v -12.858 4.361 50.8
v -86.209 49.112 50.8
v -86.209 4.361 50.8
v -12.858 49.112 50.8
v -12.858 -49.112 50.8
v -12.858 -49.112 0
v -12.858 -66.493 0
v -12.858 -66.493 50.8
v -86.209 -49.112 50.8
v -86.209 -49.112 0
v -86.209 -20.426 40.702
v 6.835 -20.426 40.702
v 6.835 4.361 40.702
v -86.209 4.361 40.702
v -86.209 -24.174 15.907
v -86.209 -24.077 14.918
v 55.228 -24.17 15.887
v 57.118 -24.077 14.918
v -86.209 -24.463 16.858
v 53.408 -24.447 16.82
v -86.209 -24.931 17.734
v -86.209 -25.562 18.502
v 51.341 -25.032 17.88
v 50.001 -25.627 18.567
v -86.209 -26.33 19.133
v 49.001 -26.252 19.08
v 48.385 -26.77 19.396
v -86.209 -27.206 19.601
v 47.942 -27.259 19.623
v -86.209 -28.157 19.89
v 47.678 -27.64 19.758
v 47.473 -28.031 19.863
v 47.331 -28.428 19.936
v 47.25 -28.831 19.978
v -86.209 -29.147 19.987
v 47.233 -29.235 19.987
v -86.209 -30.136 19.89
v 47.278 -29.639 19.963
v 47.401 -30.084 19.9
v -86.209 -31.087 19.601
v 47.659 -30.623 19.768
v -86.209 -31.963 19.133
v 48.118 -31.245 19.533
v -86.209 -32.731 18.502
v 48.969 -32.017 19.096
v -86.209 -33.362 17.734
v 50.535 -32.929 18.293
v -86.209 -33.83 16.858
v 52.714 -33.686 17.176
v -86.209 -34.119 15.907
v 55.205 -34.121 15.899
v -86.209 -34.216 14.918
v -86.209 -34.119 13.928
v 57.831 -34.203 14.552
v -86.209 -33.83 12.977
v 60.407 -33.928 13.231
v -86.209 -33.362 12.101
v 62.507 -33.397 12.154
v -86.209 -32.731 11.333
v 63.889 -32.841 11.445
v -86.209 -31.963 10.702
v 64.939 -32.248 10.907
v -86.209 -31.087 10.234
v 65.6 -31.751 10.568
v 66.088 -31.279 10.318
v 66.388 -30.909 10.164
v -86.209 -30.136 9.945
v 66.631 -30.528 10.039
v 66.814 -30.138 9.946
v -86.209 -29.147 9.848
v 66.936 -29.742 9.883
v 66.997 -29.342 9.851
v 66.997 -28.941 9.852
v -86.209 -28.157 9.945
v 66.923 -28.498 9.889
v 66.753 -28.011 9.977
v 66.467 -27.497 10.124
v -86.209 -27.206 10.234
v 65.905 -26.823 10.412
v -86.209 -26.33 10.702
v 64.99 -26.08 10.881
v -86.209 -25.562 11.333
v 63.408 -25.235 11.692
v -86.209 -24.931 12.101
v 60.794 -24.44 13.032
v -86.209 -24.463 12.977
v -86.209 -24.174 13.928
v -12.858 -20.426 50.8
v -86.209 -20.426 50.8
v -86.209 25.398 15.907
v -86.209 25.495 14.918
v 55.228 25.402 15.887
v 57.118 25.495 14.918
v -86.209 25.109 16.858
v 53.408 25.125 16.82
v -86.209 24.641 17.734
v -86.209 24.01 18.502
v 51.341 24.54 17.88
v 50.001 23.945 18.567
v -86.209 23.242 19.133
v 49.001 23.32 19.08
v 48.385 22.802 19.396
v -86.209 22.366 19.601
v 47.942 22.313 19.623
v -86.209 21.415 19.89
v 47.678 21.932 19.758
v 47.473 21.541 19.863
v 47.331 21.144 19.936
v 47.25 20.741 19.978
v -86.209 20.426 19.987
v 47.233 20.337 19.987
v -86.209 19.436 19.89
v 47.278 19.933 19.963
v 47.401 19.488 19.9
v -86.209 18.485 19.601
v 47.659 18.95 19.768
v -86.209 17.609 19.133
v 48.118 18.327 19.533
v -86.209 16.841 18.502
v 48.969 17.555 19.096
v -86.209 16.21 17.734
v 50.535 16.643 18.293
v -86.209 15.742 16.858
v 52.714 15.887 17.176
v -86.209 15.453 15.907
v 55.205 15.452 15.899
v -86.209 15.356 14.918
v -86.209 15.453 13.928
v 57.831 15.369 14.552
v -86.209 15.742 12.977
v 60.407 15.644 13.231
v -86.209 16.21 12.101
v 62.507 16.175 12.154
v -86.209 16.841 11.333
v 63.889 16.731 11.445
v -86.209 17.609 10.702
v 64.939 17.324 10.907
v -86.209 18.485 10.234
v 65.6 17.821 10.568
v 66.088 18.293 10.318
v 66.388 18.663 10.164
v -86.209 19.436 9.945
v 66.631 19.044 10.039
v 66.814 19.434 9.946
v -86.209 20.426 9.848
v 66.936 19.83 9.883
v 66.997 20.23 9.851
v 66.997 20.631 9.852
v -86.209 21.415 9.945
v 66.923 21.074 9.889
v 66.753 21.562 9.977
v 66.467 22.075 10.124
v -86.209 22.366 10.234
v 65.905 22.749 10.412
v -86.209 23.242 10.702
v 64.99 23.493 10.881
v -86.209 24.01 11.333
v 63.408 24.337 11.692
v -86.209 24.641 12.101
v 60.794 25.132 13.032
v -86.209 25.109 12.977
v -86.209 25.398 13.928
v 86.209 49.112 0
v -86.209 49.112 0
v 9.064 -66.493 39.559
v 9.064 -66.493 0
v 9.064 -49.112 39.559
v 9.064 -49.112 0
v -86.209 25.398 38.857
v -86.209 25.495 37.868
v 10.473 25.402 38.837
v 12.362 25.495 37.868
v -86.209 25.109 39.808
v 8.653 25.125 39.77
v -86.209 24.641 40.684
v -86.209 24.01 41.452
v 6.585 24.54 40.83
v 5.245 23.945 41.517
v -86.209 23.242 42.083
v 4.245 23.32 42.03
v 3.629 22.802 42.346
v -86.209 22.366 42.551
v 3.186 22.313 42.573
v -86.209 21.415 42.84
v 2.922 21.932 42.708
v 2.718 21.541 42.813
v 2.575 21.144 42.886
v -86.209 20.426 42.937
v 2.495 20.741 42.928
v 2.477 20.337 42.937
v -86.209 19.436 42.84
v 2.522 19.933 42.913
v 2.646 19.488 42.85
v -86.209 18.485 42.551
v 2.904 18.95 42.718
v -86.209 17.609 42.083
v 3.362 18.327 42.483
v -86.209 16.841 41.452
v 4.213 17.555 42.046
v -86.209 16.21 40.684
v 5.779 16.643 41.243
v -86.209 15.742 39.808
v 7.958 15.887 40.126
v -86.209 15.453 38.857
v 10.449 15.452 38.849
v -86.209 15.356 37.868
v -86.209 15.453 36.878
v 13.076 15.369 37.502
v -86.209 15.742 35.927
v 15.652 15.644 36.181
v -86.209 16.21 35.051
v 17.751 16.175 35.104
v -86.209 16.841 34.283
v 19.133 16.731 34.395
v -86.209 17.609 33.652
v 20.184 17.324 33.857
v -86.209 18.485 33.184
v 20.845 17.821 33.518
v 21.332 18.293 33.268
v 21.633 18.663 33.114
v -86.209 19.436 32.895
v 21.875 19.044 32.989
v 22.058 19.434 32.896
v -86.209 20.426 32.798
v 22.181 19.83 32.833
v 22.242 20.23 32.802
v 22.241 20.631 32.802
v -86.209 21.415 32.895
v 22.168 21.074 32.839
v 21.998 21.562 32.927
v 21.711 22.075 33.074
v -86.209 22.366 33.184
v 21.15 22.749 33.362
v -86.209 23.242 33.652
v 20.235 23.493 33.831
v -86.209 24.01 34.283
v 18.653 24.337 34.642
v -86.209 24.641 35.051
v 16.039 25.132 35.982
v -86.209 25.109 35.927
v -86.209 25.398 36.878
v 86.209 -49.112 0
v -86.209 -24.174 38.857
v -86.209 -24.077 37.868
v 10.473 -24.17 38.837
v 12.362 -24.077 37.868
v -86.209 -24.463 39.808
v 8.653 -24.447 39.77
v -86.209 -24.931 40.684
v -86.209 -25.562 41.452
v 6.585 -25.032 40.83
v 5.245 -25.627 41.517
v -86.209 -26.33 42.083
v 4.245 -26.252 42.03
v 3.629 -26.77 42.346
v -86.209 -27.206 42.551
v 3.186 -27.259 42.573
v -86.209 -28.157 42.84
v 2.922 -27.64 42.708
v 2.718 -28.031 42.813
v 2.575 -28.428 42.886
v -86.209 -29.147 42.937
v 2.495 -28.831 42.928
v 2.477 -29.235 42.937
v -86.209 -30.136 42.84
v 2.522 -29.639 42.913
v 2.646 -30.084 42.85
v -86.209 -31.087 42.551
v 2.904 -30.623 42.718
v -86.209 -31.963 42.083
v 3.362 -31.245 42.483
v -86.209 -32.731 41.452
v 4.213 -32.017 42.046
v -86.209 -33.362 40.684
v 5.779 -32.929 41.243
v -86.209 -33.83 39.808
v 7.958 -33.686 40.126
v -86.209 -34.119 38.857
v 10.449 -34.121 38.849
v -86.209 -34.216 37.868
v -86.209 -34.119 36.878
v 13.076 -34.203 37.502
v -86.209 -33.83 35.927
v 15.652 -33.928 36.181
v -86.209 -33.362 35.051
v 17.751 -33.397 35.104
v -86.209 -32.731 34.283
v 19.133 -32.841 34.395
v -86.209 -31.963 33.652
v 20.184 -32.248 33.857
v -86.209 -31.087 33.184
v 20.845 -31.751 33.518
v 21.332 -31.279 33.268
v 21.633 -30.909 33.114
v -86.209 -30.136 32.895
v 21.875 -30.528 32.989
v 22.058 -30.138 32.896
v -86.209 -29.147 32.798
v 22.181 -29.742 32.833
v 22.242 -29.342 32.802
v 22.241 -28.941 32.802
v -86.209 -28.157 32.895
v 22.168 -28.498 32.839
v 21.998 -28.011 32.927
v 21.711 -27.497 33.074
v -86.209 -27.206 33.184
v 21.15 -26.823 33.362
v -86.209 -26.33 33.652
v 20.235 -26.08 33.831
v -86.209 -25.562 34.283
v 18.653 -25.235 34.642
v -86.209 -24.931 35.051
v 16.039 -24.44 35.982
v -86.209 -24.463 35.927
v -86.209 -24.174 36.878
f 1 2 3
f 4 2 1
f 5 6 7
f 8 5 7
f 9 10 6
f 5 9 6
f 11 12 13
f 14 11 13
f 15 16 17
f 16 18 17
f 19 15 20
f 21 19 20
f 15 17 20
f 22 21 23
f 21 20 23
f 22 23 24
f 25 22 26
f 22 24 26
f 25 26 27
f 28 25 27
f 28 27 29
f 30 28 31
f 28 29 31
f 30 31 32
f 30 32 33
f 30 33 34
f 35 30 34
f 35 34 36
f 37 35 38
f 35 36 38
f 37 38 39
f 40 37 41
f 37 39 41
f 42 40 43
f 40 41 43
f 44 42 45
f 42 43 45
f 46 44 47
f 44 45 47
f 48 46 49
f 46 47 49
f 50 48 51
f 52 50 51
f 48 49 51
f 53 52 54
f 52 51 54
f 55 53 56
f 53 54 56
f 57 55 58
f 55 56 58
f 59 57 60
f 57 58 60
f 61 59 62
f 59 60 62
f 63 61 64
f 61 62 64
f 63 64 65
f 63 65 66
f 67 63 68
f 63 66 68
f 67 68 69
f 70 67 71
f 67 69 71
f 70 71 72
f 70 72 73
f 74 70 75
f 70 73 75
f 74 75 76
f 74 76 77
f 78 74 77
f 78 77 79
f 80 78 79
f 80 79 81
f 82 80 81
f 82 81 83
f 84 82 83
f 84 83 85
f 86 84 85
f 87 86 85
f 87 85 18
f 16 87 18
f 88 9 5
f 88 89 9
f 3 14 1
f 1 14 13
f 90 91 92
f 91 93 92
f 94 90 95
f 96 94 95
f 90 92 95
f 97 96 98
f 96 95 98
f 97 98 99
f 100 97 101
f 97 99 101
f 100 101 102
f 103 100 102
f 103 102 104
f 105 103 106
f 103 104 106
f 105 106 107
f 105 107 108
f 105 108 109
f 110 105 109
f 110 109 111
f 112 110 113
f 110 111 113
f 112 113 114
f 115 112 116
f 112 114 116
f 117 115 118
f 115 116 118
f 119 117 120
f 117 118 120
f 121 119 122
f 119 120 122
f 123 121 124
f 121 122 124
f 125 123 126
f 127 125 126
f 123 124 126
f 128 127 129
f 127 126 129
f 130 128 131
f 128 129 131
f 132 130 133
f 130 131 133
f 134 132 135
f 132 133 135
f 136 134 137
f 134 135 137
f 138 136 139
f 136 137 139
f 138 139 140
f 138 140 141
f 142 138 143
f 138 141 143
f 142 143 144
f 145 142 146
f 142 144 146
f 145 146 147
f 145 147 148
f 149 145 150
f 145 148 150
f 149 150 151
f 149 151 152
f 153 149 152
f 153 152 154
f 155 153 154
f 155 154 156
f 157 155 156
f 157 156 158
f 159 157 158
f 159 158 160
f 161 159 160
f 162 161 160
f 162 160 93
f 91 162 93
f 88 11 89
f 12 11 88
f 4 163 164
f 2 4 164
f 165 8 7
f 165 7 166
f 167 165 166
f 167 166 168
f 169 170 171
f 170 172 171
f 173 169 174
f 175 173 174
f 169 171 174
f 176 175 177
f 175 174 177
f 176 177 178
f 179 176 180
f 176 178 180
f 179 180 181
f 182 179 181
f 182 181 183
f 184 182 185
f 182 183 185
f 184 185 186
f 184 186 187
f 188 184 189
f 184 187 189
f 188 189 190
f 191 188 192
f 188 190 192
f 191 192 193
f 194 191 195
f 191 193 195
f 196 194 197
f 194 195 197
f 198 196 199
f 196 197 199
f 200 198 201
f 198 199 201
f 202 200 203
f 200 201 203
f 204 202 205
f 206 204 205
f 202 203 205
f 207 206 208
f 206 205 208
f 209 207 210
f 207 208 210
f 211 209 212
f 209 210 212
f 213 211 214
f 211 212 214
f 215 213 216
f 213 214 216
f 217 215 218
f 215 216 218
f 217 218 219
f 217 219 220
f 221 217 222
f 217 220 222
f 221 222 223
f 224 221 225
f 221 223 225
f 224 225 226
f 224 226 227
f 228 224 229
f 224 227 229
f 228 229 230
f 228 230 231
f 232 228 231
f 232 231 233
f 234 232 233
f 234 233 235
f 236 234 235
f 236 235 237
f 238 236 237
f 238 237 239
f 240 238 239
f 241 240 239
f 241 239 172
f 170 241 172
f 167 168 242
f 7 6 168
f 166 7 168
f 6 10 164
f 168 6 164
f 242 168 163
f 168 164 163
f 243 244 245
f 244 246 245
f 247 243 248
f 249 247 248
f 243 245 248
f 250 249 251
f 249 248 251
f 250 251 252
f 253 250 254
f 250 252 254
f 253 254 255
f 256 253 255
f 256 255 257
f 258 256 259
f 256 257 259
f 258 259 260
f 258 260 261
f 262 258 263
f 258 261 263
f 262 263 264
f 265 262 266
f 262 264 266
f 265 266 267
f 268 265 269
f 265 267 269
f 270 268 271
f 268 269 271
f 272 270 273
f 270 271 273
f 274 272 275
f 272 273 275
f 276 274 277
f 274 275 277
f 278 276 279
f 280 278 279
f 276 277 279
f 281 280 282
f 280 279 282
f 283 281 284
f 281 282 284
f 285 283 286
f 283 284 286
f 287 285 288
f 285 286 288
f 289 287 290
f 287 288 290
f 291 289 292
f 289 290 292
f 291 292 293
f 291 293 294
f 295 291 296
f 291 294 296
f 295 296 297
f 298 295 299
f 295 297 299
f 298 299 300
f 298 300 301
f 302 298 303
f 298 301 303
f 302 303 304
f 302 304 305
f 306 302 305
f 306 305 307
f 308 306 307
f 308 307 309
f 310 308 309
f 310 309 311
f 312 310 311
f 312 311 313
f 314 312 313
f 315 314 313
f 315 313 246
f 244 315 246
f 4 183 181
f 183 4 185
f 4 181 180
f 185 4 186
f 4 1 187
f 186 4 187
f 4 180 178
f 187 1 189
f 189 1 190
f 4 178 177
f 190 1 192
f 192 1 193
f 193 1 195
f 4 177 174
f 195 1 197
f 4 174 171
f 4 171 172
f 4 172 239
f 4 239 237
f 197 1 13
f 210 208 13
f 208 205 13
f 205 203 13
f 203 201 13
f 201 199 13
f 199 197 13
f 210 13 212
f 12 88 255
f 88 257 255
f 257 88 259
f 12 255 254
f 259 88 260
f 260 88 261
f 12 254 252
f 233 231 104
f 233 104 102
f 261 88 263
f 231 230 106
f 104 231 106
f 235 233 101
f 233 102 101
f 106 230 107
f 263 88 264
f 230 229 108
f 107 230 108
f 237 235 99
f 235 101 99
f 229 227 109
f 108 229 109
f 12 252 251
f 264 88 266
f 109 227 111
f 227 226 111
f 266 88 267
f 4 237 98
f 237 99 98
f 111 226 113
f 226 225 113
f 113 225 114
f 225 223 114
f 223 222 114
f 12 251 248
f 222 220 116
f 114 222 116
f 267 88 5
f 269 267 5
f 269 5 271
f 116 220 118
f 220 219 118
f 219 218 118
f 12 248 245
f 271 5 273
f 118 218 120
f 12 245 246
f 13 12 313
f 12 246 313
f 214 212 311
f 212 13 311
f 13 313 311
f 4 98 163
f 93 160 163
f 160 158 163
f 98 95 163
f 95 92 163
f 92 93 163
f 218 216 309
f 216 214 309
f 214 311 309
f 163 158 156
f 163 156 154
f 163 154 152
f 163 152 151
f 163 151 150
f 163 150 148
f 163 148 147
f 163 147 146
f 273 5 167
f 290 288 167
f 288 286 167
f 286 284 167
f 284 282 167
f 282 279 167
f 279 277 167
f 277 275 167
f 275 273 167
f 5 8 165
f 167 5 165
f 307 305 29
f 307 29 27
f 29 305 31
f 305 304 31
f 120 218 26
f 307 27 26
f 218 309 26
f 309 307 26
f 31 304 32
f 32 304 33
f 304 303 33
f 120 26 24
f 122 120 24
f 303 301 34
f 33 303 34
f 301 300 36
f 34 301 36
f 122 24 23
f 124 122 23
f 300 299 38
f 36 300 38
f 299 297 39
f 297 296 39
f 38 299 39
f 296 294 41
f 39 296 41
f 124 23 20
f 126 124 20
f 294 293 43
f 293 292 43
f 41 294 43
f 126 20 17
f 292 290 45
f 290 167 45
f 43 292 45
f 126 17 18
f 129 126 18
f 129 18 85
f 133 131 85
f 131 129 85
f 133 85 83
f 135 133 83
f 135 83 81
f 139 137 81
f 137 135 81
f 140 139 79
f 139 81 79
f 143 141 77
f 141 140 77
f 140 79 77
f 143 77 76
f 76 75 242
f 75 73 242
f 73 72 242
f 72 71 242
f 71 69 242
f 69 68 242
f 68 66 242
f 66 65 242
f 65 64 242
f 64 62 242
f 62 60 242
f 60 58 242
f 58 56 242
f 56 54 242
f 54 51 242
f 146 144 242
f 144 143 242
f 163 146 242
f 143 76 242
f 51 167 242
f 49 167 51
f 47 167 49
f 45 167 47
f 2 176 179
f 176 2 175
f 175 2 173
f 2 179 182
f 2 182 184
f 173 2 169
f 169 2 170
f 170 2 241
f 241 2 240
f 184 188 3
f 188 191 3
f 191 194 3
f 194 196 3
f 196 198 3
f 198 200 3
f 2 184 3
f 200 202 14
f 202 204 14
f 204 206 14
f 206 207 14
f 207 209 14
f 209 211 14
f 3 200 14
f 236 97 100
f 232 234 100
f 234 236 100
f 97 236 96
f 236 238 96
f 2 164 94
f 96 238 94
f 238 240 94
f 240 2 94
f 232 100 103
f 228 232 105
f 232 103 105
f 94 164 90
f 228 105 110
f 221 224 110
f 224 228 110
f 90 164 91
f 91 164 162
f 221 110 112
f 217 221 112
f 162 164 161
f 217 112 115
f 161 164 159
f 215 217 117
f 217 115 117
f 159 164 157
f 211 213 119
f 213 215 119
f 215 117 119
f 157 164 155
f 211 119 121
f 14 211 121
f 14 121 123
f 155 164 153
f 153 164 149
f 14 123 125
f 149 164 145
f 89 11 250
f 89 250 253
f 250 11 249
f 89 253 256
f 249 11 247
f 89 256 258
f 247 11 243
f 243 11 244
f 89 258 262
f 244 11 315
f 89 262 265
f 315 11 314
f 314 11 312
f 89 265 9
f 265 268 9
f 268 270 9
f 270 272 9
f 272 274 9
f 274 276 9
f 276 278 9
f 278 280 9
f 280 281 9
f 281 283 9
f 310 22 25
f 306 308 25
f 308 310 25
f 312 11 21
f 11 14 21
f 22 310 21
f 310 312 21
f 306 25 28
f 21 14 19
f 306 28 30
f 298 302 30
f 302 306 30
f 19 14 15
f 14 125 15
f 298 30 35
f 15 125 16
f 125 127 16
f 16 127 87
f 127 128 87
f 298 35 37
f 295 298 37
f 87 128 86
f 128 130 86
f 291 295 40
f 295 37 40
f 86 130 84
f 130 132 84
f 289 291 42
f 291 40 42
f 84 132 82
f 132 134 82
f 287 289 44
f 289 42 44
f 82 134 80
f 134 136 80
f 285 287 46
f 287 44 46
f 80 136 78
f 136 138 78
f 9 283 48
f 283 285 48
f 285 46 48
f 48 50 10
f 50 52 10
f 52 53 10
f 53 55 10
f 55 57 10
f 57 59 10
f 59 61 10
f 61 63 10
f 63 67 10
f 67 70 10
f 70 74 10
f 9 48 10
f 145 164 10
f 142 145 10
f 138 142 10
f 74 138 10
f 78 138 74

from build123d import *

# Parameters (mm, degrees)
F1_DEPTH      = 50.8
F3_DEPTH      = 49.1127015481
F3_DEPTH_BACK = 66.494050136
F4_R          = 5.0698297576
F4_W          = 24.7860401869
F4_H          = 10.0980177522
F5_DEPTH      = 86.2099544535
F5_DEPTH_BACK = 86.2099544535


with BuildPart() as f1:
    # F0 (on Top) → F1 (new body)
    with BuildSketch(Plane.XY):
        Polygon((-86.2089544535, 49.1117015481), (-86.2089544535, -49.1117015481), (-12.8575693816, -49.1117015481), (-12.8575693816, -66.493050136), (9.0635353699, -66.493050136), (9.0635353699, -49.1117015481), (86.2089544535, -49.1117015481), (86.2089544535, 49.1117015481), align=None)
    extrude(amount=F1_DEPTH)

    # F2 (on Front) → F3 (cut, two sides)
    with BuildSketch(Plane.XZ) as f3_sk:
        Polygon((9.0635353699, 50.8), (-12.8575693816, 50.8), (86.2089544535, 0), (86.2089544535, 50.8), align=None)
    extrude(amount=-F3_DEPTH, mode=Mode.SUBTRACT)
    extrude(f3_sk.sketch, amount=F3_DEPTH_BACK, mode=Mode.SUBTRACT)

    # F4 (on Right) → F5 (cut, two sides)
    with BuildSketch(Plane.YZ) as f5_sk:
        with Locations((-29.1465427727, 37.8675609827)):
            Circle(F4_R)
        with Locations((-29.1465427727, 14.9175236002)):
            Circle(F4_R)
        with Locations((20.425543189, 14.9175236002)):
            Circle(F4_R)
        with Locations((20.425543189, 37.8675609827)):
            Circle(F4_R)
        with Locations((-8.0325044692, 45.7509911239)):
            Rectangle(F4_W, F4_H)
    extrude(amount=-F5_DEPTH, mode=Mode.SUBTRACT)
    extrude(f5_sk.sketch, amount=F5_DEPTH_BACK, mode=Mode.SUBTRACT)


solid = f1.part
